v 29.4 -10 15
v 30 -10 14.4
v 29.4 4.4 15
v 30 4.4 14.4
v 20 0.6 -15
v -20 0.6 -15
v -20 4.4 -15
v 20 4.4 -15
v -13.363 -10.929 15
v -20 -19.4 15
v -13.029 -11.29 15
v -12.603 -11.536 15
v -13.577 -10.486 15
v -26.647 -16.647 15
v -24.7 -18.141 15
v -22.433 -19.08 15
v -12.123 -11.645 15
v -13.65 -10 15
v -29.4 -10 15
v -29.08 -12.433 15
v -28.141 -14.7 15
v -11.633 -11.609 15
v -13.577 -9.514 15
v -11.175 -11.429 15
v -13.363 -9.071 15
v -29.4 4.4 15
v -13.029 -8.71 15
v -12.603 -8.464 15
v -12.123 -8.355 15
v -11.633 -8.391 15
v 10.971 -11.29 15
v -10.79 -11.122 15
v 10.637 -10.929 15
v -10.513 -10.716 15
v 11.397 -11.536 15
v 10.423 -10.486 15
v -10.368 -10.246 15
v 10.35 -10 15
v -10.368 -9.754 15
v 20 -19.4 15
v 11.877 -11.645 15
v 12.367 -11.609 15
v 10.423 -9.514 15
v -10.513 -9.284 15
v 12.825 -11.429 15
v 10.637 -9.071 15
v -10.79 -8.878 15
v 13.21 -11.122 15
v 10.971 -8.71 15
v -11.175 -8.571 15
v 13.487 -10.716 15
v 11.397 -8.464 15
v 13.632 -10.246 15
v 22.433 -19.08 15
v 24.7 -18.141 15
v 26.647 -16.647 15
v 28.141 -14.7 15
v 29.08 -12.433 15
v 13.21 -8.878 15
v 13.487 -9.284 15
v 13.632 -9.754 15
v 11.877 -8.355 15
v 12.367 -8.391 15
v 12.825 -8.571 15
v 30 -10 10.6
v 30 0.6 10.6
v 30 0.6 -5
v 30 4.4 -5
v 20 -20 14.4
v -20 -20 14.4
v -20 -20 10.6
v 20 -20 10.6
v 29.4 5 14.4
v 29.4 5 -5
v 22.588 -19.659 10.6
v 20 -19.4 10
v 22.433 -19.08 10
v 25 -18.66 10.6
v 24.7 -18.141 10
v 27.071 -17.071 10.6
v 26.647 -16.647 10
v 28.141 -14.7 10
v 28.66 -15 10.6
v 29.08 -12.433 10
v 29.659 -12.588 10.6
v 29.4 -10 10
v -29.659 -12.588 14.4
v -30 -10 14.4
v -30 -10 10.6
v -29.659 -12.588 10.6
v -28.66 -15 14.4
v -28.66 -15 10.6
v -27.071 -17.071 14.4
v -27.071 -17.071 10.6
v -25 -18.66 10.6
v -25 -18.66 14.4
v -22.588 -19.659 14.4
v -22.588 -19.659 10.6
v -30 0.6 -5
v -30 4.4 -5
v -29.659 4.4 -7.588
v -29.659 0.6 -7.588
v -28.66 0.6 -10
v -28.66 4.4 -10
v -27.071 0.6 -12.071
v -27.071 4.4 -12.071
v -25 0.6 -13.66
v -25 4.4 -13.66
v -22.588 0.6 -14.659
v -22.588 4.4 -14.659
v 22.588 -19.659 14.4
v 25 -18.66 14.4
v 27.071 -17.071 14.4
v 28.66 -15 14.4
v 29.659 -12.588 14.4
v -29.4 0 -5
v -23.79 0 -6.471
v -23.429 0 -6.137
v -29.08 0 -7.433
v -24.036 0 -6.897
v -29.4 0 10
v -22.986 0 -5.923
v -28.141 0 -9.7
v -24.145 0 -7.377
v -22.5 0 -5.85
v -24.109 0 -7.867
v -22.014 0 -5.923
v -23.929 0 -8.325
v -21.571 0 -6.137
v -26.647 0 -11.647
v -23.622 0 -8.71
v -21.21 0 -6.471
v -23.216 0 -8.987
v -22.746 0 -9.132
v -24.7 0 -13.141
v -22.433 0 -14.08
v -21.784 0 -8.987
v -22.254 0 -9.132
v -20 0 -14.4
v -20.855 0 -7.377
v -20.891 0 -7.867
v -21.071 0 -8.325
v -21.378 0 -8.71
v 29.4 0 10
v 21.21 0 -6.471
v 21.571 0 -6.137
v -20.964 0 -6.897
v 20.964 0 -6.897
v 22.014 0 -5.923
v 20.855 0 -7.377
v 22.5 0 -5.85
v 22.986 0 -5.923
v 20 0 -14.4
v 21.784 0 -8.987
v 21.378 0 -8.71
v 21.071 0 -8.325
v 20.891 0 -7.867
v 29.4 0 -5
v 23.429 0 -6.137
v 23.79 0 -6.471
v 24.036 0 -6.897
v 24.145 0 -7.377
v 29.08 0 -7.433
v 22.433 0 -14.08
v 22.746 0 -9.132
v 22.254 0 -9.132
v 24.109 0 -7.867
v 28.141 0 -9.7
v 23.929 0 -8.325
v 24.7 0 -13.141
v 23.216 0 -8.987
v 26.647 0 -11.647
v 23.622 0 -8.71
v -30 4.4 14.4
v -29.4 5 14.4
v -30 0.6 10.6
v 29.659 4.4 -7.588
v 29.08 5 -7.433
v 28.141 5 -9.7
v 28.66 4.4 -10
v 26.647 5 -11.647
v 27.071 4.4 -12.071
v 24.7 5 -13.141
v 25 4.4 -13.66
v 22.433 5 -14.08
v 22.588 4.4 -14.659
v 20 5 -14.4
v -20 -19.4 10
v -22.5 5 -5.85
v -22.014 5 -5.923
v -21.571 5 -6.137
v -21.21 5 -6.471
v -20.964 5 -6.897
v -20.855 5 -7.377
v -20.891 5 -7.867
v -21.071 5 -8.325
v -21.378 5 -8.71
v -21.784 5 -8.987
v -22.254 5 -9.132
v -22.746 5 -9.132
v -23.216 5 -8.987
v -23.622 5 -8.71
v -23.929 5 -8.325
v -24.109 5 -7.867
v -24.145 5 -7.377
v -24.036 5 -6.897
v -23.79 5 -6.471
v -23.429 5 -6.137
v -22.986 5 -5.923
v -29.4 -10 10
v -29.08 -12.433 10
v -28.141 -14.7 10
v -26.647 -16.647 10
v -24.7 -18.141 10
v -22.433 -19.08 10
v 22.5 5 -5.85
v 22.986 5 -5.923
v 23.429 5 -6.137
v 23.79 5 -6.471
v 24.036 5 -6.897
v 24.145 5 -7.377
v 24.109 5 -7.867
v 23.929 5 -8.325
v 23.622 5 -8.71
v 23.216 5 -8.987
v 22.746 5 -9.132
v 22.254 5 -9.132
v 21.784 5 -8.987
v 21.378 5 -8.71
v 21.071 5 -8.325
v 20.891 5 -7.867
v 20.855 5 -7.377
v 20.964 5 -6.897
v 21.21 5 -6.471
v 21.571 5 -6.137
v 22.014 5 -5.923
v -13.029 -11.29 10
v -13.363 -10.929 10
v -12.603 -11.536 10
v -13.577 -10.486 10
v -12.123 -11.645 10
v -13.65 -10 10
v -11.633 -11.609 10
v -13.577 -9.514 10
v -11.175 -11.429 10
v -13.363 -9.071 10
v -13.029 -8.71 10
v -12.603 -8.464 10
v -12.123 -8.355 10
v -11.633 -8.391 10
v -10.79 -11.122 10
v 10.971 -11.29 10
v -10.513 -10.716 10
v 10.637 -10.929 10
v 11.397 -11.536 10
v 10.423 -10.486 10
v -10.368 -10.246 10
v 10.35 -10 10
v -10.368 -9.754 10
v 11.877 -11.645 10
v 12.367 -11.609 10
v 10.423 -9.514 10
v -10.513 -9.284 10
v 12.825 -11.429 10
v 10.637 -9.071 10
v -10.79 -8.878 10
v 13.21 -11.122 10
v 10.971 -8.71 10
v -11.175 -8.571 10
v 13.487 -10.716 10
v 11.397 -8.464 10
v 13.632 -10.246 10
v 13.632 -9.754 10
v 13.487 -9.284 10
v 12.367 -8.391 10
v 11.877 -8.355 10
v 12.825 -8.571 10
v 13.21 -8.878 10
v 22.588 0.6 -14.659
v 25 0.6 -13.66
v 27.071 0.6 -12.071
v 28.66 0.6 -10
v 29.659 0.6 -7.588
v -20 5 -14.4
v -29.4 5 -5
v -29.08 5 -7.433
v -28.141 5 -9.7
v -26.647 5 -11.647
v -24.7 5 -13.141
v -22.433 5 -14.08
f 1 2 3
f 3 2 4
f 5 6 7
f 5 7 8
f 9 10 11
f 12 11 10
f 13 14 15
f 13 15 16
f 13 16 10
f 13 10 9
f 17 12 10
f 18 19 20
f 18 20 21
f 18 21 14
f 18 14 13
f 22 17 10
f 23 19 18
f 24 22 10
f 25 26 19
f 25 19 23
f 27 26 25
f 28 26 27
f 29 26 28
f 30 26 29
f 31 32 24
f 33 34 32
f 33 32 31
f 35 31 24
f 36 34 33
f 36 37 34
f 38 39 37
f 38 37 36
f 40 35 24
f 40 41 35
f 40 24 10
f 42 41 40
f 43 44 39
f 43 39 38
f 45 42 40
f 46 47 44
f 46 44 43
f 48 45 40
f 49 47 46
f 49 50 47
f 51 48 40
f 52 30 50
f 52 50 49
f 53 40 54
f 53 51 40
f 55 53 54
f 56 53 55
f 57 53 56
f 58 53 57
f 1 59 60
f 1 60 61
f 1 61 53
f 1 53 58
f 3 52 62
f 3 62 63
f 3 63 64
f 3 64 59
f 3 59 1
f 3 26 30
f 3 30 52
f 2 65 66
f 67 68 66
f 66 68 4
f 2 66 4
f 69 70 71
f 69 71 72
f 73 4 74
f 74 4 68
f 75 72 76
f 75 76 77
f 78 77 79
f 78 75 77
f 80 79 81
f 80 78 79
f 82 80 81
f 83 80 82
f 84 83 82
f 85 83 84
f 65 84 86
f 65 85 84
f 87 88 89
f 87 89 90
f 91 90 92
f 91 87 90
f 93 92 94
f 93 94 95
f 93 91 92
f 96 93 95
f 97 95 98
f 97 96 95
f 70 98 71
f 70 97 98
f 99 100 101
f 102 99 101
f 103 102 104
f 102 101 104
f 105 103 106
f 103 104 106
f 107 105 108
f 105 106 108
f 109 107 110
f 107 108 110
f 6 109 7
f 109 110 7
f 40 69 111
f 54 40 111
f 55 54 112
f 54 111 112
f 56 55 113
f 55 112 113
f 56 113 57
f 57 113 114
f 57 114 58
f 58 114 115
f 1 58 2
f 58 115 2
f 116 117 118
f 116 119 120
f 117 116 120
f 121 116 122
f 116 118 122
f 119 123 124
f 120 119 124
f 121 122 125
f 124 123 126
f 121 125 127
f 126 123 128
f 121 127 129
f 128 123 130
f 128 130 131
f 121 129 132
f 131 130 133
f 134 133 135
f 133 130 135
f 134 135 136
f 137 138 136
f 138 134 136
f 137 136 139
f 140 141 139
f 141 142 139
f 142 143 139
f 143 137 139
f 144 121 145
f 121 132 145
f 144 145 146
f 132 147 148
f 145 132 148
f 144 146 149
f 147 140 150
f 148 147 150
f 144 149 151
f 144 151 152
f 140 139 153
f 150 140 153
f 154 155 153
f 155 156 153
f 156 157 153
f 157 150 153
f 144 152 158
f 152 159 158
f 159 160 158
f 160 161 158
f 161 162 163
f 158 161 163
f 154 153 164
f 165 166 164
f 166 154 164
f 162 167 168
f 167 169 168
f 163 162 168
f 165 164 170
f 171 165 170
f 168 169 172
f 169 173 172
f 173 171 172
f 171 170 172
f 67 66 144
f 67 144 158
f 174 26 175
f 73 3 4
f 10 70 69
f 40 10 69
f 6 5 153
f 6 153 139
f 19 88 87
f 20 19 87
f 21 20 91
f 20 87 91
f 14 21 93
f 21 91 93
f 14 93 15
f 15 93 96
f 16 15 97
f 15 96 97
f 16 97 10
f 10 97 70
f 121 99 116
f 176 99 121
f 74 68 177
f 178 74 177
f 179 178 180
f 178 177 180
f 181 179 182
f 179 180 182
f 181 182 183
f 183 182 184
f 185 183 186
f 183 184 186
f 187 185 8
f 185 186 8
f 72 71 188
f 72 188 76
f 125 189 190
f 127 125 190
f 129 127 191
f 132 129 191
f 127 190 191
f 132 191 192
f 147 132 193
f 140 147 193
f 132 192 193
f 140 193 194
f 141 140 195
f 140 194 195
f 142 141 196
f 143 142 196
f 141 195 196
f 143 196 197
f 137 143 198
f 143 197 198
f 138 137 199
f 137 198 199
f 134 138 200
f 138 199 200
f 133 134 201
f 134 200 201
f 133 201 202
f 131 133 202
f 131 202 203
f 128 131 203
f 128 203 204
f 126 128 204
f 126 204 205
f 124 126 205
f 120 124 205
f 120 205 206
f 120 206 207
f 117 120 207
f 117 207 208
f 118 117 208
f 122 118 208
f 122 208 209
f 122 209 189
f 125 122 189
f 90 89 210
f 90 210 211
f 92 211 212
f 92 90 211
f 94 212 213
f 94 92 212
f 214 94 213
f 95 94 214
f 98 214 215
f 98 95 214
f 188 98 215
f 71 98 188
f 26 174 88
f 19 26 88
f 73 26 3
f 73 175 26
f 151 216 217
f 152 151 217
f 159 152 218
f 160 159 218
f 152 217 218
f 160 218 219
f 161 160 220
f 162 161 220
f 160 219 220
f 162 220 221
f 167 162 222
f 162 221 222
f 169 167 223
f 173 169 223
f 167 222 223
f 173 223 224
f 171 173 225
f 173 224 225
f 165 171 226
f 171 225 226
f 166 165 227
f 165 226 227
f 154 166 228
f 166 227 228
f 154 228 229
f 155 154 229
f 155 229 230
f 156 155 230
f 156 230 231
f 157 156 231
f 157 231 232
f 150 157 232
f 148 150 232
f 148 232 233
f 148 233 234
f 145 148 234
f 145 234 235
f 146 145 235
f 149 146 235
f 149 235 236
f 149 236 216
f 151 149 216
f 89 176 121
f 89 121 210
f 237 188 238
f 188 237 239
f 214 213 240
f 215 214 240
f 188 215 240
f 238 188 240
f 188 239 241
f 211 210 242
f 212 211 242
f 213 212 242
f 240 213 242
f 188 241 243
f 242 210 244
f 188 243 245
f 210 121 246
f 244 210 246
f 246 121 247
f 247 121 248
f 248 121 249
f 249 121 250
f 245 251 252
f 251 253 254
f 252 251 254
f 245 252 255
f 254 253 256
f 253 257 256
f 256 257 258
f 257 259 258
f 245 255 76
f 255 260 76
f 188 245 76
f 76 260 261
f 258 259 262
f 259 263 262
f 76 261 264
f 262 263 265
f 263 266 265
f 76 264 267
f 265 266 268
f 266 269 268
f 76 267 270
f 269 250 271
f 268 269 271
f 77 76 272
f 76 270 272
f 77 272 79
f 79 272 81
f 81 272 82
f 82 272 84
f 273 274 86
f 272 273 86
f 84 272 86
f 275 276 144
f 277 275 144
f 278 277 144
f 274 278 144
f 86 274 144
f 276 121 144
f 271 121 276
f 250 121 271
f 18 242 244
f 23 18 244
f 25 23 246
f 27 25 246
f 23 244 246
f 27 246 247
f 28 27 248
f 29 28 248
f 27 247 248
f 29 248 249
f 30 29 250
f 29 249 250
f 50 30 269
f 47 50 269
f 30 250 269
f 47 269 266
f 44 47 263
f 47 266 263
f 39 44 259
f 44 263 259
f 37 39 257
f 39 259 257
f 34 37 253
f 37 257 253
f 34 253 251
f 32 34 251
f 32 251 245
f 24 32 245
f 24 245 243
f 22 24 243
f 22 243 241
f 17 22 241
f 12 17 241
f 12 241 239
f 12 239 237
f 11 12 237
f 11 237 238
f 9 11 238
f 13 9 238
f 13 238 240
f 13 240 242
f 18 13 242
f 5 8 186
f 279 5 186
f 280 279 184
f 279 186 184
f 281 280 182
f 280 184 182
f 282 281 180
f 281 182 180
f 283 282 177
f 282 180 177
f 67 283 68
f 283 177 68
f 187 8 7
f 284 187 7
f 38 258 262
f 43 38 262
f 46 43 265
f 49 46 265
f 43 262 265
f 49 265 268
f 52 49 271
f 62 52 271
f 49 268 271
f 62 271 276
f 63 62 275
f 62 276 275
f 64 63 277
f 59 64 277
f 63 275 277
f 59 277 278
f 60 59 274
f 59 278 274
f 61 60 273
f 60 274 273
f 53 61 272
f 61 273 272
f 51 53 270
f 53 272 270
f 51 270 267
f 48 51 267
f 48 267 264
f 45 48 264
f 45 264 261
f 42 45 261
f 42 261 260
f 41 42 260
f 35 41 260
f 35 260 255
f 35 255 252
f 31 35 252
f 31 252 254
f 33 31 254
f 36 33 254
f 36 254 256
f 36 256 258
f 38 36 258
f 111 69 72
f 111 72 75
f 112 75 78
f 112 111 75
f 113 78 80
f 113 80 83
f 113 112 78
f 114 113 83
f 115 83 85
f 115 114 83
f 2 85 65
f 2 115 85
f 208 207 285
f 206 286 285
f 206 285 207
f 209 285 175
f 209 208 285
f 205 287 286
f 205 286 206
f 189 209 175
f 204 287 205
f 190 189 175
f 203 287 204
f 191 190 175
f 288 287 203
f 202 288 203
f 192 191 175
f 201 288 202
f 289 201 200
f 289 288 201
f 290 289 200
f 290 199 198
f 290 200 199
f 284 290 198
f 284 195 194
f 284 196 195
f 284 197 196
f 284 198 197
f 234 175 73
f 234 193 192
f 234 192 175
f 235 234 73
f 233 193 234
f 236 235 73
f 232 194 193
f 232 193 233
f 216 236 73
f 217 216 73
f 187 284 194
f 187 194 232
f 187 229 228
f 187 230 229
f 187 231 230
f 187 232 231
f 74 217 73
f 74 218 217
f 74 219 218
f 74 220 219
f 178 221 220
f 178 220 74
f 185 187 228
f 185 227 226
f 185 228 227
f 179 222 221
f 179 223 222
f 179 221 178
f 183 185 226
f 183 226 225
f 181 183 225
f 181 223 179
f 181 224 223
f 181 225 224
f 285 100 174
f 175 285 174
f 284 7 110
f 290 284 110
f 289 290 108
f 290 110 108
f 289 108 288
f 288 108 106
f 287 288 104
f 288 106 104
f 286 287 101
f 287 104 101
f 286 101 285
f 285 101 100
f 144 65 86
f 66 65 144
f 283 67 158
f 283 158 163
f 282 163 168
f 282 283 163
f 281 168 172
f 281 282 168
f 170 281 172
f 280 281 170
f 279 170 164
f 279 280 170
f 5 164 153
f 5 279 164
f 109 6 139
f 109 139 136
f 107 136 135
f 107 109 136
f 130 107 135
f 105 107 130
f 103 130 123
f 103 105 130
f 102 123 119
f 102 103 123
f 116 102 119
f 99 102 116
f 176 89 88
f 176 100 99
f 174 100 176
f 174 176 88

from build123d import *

# Parameters (mm, degrees)
SKETCH1_W           = 60
SKETCH1_H           = 30
BOSS_EXTRUDE1_DEPTH = 5
SKETCH2_R           = 1.65
CUT_EXTRUDE1_DEPTH  = 34.911649916
SKETCH3_W           = 60
SKETCH3_H           = 5
BOSS_EXTRUDE2_DEPTH = 20
SKETCH4_R           = 1.65
CUT_EXTRUDE2_DEPTH  = 10
FILLET1_R           = 10
CHAMFER1_SIZE       = 0.6


with BuildPart() as part:
    # Sketch1 → Boss-Extrude1 (new body)
    with BuildSketch(Plane(origin=(0, 0, 0), x_dir=(1, 0, 0), z_dir=(0, 1, 0))):
        Rectangle(SKETCH1_W, SKETCH1_H)
    extrude(amount=BOSS_EXTRUDE1_DEPTH)

    # Sketch2 → Cut-Extrude1 (cut, through all)
    with BuildSketch(Plane(origin=(0, 5, 0), x_dir=(1, 0, 0), z_dir=(0, 1, 0))):
        with Locations(Location((-22.5, 7.5, 0), (0, 0, 270))):
            Circle(SKETCH2_R)
        with Locations(Location((22.5, 7.5, 0), (0, 0, 270))):
            Circle(SKETCH2_R)
    extrude(amount=-CUT_EXTRUDE1_DEPTH, mode=Mode.SUBTRACT)

    # Sketch3 → Boss-Extrude2 (add)
    with BuildSketch(Plane.XZ):
        with Locations((0, 12.5)):
            Rectangle(SKETCH3_W, SKETCH3_H)
    extrude(amount=BOSS_EXTRUDE2_DEPTH)

    # Sketch4 → Cut-Extrude2 (cut)
    with BuildSketch(Plane(origin=(0, 0, 10), x_dir=(-1, 0, 0), z_dir=(0, 0, -1))):
        with Locations((-12, -10)):
            Circle(SKETCH4_R)
        with Locations((12, -10)):
            Circle(SKETCH4_R)
    extrude(amount=-CUT_EXTRUDE2_DEPTH, mode=Mode.SUBTRACT)

    # Fillet1
    fillet1_edges = [part.edges().sort_by_distance(p)[0] for p in [
        (-30, -20, 12.5),
        (30, -20, 12.5),
        (-30, 2.5, -15),
        (30, 2.5, -15),
    ]]
    fillet(fillet1_edges, radius=FILLET1_R)

    # Chamfer1
    chamfer1_edges = [part.edges().sort_by_distance(p)[0] for p in [
        (0, 5, 15),
        (30, 0, 2.5),
        (0, -20, 10),
        (0, -20, 15),
        (30, -5, 10),
        (-30, -5, 10),
        (27.071067812, -17.071067812, 10),
        (-27.071067812, -17.071067812, 10),
        (30, 5, 5),
        (-30, 0, 2.5),
        (-30, 5, 5),
        (27.071067812, -17.071067812, 15),
        (-27.071067812, -17.071067812, 15),
        (0, 0, -15),
        (27.071067812, 0, -12.071067812),
        (-27.071067812, 0, -12.071067812),
        (0, 5, -15),
        (27.071067812, 5, -12.071067812),
        (-27.071067812, 5, -12.071067812),
        (30, -2.5, 15),
        (-30, -2.5, 15),
    ]]
    chamfer(chamfer1_edges, length=CHAMFER1_SIZE)


solid = part.part
